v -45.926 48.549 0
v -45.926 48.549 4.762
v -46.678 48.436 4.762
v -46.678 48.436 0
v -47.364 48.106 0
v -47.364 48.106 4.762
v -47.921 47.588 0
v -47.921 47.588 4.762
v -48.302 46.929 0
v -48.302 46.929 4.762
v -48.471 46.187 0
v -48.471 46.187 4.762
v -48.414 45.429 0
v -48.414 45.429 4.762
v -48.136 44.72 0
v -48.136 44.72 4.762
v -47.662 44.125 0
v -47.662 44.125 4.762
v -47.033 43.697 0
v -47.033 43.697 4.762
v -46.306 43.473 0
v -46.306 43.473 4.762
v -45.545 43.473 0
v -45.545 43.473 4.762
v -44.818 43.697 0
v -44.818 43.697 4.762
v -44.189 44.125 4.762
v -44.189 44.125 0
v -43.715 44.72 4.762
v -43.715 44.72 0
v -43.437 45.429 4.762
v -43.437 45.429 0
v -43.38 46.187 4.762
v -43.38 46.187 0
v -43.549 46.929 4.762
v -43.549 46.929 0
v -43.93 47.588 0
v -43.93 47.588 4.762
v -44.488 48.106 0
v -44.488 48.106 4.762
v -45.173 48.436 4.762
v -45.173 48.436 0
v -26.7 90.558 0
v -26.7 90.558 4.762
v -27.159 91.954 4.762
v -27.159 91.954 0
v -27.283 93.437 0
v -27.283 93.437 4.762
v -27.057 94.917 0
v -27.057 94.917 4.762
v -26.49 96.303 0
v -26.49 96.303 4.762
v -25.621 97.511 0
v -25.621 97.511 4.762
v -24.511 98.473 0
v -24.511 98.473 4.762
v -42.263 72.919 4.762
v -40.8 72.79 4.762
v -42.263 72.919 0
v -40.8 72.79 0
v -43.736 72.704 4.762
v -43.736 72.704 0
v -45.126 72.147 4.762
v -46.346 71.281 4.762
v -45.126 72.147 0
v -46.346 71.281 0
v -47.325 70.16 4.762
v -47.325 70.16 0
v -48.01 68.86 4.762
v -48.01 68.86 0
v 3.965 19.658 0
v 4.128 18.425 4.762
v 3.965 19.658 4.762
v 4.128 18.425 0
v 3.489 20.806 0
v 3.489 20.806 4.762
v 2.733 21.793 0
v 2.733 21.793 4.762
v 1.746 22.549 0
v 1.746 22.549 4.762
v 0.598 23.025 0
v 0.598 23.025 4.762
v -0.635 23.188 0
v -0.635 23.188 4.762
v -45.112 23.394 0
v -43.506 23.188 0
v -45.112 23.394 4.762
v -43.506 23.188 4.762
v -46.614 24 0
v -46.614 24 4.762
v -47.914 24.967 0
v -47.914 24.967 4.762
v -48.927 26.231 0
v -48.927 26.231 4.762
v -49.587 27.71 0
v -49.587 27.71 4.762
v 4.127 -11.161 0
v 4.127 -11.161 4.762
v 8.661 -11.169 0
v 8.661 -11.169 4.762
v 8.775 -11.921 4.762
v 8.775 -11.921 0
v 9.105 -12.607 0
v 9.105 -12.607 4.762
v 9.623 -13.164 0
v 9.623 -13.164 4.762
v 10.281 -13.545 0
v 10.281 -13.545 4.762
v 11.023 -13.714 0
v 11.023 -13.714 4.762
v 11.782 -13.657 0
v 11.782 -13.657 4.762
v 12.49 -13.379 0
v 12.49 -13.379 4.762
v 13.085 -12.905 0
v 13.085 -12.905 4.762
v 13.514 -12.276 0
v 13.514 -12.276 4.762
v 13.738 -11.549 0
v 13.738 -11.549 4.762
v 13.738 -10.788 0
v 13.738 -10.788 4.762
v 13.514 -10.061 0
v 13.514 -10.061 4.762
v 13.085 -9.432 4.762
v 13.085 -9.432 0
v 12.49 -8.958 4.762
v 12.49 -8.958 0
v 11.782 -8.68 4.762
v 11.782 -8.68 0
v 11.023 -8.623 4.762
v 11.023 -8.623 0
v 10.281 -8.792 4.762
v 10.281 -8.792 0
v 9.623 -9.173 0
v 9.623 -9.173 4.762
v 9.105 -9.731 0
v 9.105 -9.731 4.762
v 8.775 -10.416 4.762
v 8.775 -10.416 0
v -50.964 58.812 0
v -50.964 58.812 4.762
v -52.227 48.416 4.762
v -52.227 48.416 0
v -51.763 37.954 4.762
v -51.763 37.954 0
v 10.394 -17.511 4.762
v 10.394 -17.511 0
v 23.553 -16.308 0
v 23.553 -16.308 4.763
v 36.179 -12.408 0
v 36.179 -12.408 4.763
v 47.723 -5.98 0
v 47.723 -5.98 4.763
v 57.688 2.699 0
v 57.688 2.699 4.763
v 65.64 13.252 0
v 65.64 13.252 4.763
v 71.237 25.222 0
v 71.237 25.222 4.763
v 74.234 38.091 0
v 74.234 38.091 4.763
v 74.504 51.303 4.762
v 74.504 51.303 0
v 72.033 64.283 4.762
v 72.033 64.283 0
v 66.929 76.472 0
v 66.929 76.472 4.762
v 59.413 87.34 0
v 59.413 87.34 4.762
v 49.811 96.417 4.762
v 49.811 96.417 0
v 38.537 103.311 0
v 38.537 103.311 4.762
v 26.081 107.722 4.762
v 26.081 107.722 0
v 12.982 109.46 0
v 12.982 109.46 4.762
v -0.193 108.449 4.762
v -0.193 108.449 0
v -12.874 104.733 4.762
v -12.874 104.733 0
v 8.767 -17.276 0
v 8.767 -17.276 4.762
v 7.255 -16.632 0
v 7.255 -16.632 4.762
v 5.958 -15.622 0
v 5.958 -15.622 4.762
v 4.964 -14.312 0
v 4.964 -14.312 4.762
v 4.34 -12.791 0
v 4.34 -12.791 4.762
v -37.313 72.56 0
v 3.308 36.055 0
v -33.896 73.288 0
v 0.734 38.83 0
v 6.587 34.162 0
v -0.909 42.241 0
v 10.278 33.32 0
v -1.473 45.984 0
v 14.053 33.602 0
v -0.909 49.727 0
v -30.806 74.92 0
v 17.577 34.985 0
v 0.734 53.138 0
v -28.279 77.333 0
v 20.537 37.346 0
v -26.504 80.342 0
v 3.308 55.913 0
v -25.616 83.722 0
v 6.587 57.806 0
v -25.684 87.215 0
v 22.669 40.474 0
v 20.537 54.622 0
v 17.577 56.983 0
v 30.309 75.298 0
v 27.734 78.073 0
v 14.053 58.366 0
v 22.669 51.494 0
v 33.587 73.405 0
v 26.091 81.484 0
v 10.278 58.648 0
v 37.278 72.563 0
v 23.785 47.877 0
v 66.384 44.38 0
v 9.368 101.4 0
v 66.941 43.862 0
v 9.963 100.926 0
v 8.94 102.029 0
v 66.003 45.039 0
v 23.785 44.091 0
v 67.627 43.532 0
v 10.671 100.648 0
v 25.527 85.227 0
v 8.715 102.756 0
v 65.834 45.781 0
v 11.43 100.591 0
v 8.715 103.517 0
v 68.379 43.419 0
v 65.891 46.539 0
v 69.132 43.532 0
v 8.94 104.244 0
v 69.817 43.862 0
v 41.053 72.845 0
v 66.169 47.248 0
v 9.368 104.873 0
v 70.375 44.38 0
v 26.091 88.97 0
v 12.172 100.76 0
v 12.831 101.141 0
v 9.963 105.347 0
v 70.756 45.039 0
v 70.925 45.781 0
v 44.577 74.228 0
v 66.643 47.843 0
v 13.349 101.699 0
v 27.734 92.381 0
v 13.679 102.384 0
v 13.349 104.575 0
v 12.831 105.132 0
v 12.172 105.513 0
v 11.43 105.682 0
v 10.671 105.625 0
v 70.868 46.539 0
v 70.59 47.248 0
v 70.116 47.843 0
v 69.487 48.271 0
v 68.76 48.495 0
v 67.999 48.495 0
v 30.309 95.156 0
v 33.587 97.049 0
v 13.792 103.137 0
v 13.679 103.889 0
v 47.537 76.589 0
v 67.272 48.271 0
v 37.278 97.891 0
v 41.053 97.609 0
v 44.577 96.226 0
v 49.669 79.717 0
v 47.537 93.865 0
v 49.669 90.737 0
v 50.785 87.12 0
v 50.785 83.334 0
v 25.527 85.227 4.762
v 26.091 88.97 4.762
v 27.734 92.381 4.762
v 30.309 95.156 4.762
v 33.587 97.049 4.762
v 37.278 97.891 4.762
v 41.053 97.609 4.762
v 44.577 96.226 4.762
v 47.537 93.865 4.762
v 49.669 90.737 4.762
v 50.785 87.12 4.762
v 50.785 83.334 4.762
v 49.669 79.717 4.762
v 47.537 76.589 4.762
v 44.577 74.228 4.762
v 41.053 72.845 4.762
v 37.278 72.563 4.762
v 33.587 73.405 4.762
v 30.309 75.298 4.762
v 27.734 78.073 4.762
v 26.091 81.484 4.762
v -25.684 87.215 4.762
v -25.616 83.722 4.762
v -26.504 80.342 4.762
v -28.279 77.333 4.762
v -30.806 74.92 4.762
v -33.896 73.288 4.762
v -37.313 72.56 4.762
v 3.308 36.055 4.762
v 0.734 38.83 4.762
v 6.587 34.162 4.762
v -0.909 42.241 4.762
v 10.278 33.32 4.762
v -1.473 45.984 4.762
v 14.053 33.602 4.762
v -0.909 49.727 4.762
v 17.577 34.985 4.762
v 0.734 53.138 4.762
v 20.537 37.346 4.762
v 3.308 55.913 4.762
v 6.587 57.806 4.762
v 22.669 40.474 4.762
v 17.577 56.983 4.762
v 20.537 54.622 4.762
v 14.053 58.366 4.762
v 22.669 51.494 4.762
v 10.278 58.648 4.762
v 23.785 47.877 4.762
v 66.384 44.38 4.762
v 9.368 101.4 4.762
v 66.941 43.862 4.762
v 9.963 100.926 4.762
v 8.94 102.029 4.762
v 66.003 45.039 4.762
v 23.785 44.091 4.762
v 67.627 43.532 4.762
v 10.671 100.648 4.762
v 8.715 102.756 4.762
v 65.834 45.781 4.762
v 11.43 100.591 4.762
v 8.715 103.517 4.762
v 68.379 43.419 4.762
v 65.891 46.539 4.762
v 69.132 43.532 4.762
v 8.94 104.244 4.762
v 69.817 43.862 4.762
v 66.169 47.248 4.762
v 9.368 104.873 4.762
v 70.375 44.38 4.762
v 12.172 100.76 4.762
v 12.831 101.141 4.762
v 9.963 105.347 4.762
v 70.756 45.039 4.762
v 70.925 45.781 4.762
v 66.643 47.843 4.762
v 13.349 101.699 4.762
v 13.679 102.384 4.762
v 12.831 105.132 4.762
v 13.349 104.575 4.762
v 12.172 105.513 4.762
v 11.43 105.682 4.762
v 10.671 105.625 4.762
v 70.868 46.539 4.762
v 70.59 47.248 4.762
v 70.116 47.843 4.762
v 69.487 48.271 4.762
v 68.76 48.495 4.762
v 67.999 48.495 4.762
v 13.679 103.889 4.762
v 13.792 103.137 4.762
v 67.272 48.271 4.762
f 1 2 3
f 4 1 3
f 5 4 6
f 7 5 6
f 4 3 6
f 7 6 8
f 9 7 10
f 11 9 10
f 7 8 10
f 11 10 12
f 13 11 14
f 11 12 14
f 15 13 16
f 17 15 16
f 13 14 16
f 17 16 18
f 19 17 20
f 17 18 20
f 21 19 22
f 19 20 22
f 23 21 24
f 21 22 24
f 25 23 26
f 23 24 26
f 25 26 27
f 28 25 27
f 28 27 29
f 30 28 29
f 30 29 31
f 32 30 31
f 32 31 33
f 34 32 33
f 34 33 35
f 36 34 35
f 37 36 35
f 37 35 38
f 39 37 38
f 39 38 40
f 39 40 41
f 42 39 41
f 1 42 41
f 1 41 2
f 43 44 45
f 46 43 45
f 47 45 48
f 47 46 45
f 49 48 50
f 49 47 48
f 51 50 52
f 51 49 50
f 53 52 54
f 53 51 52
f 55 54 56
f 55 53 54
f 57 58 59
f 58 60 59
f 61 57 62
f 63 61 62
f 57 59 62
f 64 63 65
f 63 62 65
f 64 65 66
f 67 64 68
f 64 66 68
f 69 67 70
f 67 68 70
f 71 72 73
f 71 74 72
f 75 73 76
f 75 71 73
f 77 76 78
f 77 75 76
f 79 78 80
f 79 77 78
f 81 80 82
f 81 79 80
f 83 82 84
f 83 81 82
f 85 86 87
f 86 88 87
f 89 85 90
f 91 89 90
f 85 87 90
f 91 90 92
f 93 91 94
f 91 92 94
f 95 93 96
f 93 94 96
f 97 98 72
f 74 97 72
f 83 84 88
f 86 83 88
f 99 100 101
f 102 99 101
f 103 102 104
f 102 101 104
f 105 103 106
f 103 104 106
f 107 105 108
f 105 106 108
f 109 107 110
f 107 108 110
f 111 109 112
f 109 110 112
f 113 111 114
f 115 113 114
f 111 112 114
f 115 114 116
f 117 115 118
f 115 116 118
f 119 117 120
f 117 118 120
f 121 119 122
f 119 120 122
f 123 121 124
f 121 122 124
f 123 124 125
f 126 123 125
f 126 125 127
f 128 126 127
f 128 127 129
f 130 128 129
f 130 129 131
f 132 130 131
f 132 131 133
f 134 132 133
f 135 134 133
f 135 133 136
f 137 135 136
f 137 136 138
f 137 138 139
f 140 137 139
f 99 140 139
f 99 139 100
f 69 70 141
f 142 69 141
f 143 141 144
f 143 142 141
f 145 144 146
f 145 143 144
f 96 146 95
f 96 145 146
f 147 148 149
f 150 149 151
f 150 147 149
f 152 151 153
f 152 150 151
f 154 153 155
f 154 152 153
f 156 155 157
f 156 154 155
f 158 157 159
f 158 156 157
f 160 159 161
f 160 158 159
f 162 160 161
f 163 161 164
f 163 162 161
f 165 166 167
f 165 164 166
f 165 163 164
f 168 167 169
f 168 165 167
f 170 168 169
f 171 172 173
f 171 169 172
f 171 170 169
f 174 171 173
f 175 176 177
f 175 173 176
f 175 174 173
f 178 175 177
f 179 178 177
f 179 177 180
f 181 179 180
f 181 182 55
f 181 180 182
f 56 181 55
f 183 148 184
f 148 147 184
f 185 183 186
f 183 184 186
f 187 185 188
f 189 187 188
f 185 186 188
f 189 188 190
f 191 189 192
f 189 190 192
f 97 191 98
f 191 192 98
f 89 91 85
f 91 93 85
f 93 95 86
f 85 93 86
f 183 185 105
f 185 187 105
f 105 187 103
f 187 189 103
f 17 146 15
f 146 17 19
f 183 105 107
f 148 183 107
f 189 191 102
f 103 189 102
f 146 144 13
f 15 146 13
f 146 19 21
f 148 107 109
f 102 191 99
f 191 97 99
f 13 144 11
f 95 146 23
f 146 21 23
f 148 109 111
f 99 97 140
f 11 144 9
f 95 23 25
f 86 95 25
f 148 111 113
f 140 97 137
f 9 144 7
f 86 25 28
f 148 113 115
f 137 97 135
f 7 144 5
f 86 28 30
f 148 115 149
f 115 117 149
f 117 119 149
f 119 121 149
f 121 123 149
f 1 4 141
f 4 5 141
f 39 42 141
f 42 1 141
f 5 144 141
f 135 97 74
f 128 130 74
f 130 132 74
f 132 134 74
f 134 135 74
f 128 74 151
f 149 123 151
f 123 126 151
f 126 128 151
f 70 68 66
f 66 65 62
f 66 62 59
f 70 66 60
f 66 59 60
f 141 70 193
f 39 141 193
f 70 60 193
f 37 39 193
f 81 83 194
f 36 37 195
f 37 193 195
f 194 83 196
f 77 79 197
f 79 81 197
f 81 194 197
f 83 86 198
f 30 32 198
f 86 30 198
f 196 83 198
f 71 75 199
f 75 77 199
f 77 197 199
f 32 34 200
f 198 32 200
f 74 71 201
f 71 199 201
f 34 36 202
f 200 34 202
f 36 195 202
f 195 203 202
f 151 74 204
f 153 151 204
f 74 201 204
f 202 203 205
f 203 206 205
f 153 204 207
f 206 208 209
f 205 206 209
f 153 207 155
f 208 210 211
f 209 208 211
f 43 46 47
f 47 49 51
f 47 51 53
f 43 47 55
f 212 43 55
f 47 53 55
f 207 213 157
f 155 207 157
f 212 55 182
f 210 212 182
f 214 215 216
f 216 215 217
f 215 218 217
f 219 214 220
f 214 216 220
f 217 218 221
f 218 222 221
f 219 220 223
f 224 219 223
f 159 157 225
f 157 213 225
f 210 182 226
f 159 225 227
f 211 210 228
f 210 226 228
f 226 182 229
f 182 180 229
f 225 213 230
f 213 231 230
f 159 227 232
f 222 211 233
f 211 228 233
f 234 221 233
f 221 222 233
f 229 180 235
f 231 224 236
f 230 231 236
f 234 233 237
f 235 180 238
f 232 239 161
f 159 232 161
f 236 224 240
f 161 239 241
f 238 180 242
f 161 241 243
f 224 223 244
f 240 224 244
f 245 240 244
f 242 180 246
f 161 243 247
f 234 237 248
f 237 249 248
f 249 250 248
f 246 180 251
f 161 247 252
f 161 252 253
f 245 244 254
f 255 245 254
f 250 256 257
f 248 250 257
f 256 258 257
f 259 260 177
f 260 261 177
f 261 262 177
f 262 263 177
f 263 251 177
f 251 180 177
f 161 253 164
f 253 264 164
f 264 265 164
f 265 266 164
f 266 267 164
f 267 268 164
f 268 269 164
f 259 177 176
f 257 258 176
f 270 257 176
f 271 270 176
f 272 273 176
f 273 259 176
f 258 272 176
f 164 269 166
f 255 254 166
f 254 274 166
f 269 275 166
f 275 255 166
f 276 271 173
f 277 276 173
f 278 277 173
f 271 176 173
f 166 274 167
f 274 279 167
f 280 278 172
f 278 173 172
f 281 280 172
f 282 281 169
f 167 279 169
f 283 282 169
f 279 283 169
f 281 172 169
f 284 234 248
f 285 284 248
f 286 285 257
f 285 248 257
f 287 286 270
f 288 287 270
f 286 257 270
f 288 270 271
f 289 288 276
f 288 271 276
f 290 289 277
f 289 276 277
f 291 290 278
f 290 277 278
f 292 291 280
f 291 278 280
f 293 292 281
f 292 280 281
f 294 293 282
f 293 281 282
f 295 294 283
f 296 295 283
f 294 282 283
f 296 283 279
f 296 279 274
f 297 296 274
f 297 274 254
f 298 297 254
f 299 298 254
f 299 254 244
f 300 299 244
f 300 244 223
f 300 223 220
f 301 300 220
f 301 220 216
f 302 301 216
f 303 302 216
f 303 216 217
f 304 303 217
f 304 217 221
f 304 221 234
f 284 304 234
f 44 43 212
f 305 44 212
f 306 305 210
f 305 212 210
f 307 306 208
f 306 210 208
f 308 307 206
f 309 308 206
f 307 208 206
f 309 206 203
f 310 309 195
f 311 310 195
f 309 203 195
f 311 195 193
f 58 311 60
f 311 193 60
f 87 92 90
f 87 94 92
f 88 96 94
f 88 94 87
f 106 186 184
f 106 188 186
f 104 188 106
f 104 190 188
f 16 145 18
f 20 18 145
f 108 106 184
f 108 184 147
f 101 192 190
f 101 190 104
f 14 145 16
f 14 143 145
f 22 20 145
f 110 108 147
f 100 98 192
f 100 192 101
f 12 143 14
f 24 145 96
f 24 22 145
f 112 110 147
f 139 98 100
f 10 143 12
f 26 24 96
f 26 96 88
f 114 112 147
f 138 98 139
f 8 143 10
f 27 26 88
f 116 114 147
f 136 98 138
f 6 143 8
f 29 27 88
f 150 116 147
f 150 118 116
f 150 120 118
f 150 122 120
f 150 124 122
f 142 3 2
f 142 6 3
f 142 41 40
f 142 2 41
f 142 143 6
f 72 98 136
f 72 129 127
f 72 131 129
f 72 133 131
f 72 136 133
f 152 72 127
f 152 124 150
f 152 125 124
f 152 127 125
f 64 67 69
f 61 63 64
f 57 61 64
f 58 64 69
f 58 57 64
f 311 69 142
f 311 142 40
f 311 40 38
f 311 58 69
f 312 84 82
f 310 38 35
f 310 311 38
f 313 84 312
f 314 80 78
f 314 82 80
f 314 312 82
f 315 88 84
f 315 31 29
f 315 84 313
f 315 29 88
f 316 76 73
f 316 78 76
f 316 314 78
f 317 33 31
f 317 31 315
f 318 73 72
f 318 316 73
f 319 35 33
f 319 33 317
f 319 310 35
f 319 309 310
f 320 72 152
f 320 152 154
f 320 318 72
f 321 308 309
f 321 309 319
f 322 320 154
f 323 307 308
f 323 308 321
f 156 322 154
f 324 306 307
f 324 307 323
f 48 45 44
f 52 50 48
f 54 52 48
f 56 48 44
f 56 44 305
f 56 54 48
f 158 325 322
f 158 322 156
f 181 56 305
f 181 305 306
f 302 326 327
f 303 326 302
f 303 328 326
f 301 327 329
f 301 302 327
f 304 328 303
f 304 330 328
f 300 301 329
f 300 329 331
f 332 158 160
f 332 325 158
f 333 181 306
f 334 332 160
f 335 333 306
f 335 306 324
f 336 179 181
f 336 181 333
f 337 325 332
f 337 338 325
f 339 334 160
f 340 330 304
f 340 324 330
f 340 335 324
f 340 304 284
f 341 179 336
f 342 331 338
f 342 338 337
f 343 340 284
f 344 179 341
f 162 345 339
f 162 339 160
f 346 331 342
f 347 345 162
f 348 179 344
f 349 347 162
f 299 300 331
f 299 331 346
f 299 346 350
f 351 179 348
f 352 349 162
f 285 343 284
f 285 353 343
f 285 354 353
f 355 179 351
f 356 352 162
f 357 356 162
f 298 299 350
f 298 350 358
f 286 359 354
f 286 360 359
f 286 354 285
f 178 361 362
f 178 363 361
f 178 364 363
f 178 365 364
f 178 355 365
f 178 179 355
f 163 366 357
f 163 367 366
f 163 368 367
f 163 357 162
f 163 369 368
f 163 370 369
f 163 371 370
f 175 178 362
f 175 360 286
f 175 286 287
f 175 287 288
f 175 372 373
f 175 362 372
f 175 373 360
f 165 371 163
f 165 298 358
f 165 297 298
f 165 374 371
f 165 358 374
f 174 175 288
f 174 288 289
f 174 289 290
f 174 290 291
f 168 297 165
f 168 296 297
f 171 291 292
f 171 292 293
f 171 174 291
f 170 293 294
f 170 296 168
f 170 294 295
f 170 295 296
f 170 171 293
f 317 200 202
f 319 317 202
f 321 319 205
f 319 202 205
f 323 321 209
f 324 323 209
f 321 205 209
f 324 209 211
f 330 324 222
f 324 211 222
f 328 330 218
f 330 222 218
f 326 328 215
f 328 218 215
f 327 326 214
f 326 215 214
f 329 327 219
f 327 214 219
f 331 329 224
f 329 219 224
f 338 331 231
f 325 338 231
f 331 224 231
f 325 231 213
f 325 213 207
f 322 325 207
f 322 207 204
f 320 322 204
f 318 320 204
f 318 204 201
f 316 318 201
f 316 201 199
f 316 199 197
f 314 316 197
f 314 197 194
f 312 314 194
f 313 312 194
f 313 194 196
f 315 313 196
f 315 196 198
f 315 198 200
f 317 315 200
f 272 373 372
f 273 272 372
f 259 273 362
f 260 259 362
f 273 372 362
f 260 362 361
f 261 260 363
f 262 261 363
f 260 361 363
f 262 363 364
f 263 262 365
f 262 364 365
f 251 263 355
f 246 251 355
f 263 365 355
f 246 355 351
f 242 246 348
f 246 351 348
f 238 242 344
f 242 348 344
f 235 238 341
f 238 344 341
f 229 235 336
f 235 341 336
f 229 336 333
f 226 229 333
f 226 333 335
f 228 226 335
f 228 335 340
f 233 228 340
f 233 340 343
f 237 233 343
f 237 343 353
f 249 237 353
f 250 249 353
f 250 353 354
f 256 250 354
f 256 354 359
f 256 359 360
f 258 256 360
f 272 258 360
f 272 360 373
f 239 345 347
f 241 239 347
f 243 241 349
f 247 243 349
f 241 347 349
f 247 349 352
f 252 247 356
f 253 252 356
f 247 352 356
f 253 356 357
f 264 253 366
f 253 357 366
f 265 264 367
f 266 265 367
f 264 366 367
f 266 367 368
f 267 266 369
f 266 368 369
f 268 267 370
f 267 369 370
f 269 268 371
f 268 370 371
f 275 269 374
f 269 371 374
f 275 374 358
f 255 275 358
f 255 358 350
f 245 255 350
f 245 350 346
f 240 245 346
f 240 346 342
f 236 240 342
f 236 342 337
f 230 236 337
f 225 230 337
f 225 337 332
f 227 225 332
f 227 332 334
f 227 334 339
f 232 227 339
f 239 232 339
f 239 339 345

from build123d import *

# Parameters (mm, degrees)
SKETCH2_W                  = 228.6
SKETCH2_H                  = 165.1
BOSS_EXTRUDE1_DEPTH        = 4.7625
F_1_2_0_5_DIAMETER_HOLE1_D = 25.4
SKETCH7_R                  = 66.675
CUT_EXTRUDE4_DEPTH         = 169.123203057
FILLET1_R                  = 6.35
CUT_EXTRUDE5_DEPTH         = 169.123203057
FILLET2_R                  = 4.7625
SKETCH9_R                  = 2.5527
CUT_EXTRUDE6_DEPTH         = 169.123203057
SKETCH10_OUTSIDE_W         = 285.248
SKETCH10_OUTSIDE_H         = 206.251
SKETCH10_OUTSIDE_R         = 63.5
CUT_EXTRUDE7_DEPTH         = 169.123203057
FILLET3_R                  = 6.35
SKETCH11_R                 = 2.5527
CUT_EXTRUDE8_DEPTH         = 133.640575761
CIRPATTERN1_COUNT          = 4


with BuildPart() as part:
    # Sketch2 → Boss-Extrude1 (new body)
    with BuildSketch(Plane.XY):
        with Locations((0, 40.65)):
            Rectangle(SKETCH2_W, SKETCH2_H)
    extrude(amount=BOSS_EXTRUDE1_DEPTH)

    # 1/2 (0.5) Diameter Hole1 (through all)
    with Locations(Plane.XY.offset(4.7625)):
        with Locations((-38.227, 85.227), (38.227, 85.227), (11.2268, 45.984)):
            Hole(F_1_2_0_5_DIAMETER_HOLE1_D / 2)

    # Sketch7 → Cut-Extrude4 (cut, through all)
    with BuildSketch(Plane(origin=(0, 0, 0), x_dir=(-1, 0, 0), z_dir=(0, 0, -1))):
        with Locations((0, 180.35)):
            Circle(SKETCH7_R)
    extrude(amount=-CUT_EXTRUDE4_DEPTH, mode=Mode.SUBTRACT)

    # Fillet1
    fillet1_edges = [part.edges().sort_by_distance(p)[0] for p in [
        (-114.3, -41.9, 2.38125),
        (114.3, -41.9, 2.38125),
        (114.3, 123.2, 2.38125),
        (-114.3, 123.2, 2.38125),
    ]]
    fillet(fillet1_edges, radius=FILLET1_R)

    # Sketch8 → Cut-Extrude5 (cut, through all)
    with BuildSketch(Plane.XY.offset(4.7625)):
        with BuildLine():
            Line((-107.95, -41.9), (107.95, -41.9))
            ThreePointArc((107.95, -41.9), (112.440128061, -40.040128061), (114.3, -35.55))
            Line((114.3, -35.55), (114.3, -10.15))
            Line((114.3, -10.15), (56.945117879, -10.15))
            ThreePointArc((56.945117879, -10.15), (32.110421547, -23.329546563), (4.1275, -26.053274001))
            Line((4.1275, -26.053274001), (4.1275, 23.1875))
            Line((4.1275, 23.1875), (-53.975, 23.1875))
            Line((-53.975, 23.1875), (-53.975, -10.15))
            Line((-53.975, -10.15), (-114.3, -10.15))
            Line((-114.3, -10.15), (-114.3, -35.55))
            ThreePointArc((-114.3, -35.55), (-112.440128061, -40.040128061), (-107.95, -41.9))
        make_face()
    extrude(amount=-CUT_EXTRUDE5_DEPTH, mode=Mode.SUBTRACT)

    # Fillet2
    fillet2_edges = [part.edges().sort_by_distance(p)[0] for p in [
        (114.3, -10.15, 2.38125),
        (56.945117879, -10.15, 2.38125),
        (4.1275, -26.053274001, 2.38125),
        (4.1275, 23.1875, 2.38125),
        (-53.975, 23.1875, 2.38125),
        (-53.975, -10.15, 2.38125),
        (-114.3, -10.15, 2.38125),
    ]]
    fillet(fillet2_edges, radius=FILLET2_R)

    # Sketch9 → Cut-Extrude6 (cut, through all)
    with BuildSketch(Plane.XY.offset(4.7625)):
        with Locations((-107.95, 116.85)):
            Circle(SKETCH9_R)
        with Locations((-109.5375, -5.3875)):
            Circle(SKETCH9_R)
        with Locations((109.5375, -5.3875)):
            Circle(SKETCH9_R)
        with Locations((107.95, 116.85)):
            Circle(SKETCH9_R)
    extrude(amount=-CUT_EXTRUDE6_DEPTH, mode=Mode.SUBTRACT)

    # Sketch10 outside → Cut-Extrude7 (cut, through all)
    with BuildSketch(Plane.XY.offset(4.7625)):
        with Locations((0, 48.3985)):
            Rectangle(SKETCH10_OUTSIDE_W, SKETCH10_OUTSIDE_H)
        with Locations((11.2268, 45.984)):
            Circle(SKETCH10_OUTSIDE_R, mode=Mode.SUBTRACT)
    extrude(amount=-CUT_EXTRUDE7_DEPTH, mode=Mode.SUBTRACT)

    # Fillet3
    fillet3_edges = [part.edges().sort_by_distance(p)[0] for p in [
        (4.1275, -17.117901235, 2.38125),
        (-29.641139389, 94.585044537, 2.38125),
        (-45.389292566, 74.73931364, 2.38125),
        (-48.040135029, 23.1875, 2.38125),
    ]]
    fillet(fillet3_edges, radius=FILLET3_R)

    # Sketch11 → Cut-Extrude8 (cut, through all)
    with BuildSketch(Plane.XY.offset(4.7625)):
        with Locations((11.2395, 103.136517476)):
            Circle(SKETCH11_R)
    cut_extrude8 = extrude(amount=-CUT_EXTRUDE8_DEPTH, mode=Mode.SUBTRACT)

    # CirPattern1: Cut-Extrude8 ×4 about axis
    cirpattern1_axis = Axis((11.2268, 45.984, 4.7625), (0, 0, 1))
    for i in range(1, CIRPATTERN1_COUNT):
        add(cut_extrude8.rotate(cirpattern1_axis, i * 360 / CIRPATTERN1_COUNT), mode=Mode.SUBTRACT)


solid = part.part
